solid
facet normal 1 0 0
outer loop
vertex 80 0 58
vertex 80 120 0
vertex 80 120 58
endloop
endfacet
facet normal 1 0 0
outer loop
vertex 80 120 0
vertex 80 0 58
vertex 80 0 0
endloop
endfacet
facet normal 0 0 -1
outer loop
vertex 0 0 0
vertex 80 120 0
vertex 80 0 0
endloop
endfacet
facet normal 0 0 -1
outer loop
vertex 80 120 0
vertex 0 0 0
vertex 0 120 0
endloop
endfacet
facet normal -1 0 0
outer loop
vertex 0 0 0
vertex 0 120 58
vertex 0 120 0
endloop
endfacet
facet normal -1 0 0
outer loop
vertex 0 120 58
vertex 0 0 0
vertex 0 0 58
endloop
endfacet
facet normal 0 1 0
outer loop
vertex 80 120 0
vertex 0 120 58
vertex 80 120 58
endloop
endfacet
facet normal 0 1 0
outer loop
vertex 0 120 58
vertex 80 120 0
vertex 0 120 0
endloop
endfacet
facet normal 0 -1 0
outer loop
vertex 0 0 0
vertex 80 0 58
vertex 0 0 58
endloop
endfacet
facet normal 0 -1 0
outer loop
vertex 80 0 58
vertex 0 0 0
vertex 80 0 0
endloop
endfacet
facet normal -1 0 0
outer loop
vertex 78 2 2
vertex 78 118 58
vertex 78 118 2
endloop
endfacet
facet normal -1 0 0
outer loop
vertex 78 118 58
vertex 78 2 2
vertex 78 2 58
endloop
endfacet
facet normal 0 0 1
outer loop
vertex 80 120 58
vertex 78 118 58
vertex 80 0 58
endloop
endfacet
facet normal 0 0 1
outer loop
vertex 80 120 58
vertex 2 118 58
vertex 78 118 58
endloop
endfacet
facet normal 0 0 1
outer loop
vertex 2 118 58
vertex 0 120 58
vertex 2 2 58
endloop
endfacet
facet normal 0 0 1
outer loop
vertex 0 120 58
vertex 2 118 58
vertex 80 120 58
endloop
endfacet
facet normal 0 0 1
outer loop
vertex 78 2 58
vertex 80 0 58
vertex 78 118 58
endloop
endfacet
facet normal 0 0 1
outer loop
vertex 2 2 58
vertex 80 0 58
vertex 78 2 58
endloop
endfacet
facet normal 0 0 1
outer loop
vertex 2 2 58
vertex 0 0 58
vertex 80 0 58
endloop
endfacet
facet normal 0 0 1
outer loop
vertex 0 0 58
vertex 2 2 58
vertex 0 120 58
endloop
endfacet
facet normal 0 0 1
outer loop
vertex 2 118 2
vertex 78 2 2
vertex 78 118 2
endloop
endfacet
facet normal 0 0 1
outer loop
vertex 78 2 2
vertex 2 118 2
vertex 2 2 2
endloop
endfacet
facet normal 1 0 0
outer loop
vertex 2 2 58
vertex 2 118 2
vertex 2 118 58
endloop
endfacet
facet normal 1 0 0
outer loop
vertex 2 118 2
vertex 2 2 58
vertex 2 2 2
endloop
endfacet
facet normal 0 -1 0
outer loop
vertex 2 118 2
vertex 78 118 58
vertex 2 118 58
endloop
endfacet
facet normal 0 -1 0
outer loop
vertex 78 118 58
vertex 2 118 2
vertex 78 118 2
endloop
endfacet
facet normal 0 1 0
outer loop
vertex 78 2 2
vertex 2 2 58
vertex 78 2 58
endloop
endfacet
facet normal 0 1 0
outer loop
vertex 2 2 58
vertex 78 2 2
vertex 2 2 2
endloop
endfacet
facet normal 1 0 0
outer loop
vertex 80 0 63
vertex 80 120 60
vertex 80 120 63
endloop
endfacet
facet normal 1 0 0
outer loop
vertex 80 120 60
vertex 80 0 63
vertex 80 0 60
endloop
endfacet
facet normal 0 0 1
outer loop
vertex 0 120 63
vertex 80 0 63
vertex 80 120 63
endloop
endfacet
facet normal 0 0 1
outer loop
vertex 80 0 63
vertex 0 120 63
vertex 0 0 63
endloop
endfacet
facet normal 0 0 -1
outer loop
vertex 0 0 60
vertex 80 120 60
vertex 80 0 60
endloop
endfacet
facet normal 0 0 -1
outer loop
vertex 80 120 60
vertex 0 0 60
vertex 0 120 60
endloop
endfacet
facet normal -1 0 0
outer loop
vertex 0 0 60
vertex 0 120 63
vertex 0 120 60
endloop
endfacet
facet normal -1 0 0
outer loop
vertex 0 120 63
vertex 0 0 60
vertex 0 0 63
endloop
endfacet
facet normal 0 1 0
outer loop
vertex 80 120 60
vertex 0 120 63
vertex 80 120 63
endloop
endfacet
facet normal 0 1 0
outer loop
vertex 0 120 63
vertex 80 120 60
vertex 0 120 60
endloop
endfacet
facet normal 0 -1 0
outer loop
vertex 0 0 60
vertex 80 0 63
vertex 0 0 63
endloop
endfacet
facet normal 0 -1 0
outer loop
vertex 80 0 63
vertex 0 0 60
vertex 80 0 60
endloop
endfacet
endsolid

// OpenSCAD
// 03stackablebins.scad
// Advanced: Stackable storage bins
// Parameters
binw = 80;      // width
bind = 120;     // depth
binh = 60;      // height
wall = 2;        // wall thickness
rim = 3;         // interlock rim height
chamfer = 2;
stackclear = 0.6; // clearance between stacks

module outer(){
  cube([binw, bind, binh]);
}

module inner(){
  translate([wall, wall, wall])
    cube([binw-2*wall, bind-2*wall, binh-2*wall]);
}

module body(){
  difference(){ outer(); inner(); }
}

module rimouter(){
  translate([0,0,binh]) cube([binw, bind, rim]);
}

module riminner(){
  translate([wall+stackclear, wall+stackclear, binh])
    cube([binw-2*(wall+stackclear), bind-2*(wall+stackclear), rim]);
}

module chamferedges(){
  // Simple top edge chamfer via difference
  difference(){
    children();
    translate([-1,-1,binh-chamfer]) cube([binw+2, bind+2, chamfer+2]);
  }
}

union(){
  chamferedges(){ body(); }
  rimouter();
  difference(){ rimouter(); riminner(); }
}
